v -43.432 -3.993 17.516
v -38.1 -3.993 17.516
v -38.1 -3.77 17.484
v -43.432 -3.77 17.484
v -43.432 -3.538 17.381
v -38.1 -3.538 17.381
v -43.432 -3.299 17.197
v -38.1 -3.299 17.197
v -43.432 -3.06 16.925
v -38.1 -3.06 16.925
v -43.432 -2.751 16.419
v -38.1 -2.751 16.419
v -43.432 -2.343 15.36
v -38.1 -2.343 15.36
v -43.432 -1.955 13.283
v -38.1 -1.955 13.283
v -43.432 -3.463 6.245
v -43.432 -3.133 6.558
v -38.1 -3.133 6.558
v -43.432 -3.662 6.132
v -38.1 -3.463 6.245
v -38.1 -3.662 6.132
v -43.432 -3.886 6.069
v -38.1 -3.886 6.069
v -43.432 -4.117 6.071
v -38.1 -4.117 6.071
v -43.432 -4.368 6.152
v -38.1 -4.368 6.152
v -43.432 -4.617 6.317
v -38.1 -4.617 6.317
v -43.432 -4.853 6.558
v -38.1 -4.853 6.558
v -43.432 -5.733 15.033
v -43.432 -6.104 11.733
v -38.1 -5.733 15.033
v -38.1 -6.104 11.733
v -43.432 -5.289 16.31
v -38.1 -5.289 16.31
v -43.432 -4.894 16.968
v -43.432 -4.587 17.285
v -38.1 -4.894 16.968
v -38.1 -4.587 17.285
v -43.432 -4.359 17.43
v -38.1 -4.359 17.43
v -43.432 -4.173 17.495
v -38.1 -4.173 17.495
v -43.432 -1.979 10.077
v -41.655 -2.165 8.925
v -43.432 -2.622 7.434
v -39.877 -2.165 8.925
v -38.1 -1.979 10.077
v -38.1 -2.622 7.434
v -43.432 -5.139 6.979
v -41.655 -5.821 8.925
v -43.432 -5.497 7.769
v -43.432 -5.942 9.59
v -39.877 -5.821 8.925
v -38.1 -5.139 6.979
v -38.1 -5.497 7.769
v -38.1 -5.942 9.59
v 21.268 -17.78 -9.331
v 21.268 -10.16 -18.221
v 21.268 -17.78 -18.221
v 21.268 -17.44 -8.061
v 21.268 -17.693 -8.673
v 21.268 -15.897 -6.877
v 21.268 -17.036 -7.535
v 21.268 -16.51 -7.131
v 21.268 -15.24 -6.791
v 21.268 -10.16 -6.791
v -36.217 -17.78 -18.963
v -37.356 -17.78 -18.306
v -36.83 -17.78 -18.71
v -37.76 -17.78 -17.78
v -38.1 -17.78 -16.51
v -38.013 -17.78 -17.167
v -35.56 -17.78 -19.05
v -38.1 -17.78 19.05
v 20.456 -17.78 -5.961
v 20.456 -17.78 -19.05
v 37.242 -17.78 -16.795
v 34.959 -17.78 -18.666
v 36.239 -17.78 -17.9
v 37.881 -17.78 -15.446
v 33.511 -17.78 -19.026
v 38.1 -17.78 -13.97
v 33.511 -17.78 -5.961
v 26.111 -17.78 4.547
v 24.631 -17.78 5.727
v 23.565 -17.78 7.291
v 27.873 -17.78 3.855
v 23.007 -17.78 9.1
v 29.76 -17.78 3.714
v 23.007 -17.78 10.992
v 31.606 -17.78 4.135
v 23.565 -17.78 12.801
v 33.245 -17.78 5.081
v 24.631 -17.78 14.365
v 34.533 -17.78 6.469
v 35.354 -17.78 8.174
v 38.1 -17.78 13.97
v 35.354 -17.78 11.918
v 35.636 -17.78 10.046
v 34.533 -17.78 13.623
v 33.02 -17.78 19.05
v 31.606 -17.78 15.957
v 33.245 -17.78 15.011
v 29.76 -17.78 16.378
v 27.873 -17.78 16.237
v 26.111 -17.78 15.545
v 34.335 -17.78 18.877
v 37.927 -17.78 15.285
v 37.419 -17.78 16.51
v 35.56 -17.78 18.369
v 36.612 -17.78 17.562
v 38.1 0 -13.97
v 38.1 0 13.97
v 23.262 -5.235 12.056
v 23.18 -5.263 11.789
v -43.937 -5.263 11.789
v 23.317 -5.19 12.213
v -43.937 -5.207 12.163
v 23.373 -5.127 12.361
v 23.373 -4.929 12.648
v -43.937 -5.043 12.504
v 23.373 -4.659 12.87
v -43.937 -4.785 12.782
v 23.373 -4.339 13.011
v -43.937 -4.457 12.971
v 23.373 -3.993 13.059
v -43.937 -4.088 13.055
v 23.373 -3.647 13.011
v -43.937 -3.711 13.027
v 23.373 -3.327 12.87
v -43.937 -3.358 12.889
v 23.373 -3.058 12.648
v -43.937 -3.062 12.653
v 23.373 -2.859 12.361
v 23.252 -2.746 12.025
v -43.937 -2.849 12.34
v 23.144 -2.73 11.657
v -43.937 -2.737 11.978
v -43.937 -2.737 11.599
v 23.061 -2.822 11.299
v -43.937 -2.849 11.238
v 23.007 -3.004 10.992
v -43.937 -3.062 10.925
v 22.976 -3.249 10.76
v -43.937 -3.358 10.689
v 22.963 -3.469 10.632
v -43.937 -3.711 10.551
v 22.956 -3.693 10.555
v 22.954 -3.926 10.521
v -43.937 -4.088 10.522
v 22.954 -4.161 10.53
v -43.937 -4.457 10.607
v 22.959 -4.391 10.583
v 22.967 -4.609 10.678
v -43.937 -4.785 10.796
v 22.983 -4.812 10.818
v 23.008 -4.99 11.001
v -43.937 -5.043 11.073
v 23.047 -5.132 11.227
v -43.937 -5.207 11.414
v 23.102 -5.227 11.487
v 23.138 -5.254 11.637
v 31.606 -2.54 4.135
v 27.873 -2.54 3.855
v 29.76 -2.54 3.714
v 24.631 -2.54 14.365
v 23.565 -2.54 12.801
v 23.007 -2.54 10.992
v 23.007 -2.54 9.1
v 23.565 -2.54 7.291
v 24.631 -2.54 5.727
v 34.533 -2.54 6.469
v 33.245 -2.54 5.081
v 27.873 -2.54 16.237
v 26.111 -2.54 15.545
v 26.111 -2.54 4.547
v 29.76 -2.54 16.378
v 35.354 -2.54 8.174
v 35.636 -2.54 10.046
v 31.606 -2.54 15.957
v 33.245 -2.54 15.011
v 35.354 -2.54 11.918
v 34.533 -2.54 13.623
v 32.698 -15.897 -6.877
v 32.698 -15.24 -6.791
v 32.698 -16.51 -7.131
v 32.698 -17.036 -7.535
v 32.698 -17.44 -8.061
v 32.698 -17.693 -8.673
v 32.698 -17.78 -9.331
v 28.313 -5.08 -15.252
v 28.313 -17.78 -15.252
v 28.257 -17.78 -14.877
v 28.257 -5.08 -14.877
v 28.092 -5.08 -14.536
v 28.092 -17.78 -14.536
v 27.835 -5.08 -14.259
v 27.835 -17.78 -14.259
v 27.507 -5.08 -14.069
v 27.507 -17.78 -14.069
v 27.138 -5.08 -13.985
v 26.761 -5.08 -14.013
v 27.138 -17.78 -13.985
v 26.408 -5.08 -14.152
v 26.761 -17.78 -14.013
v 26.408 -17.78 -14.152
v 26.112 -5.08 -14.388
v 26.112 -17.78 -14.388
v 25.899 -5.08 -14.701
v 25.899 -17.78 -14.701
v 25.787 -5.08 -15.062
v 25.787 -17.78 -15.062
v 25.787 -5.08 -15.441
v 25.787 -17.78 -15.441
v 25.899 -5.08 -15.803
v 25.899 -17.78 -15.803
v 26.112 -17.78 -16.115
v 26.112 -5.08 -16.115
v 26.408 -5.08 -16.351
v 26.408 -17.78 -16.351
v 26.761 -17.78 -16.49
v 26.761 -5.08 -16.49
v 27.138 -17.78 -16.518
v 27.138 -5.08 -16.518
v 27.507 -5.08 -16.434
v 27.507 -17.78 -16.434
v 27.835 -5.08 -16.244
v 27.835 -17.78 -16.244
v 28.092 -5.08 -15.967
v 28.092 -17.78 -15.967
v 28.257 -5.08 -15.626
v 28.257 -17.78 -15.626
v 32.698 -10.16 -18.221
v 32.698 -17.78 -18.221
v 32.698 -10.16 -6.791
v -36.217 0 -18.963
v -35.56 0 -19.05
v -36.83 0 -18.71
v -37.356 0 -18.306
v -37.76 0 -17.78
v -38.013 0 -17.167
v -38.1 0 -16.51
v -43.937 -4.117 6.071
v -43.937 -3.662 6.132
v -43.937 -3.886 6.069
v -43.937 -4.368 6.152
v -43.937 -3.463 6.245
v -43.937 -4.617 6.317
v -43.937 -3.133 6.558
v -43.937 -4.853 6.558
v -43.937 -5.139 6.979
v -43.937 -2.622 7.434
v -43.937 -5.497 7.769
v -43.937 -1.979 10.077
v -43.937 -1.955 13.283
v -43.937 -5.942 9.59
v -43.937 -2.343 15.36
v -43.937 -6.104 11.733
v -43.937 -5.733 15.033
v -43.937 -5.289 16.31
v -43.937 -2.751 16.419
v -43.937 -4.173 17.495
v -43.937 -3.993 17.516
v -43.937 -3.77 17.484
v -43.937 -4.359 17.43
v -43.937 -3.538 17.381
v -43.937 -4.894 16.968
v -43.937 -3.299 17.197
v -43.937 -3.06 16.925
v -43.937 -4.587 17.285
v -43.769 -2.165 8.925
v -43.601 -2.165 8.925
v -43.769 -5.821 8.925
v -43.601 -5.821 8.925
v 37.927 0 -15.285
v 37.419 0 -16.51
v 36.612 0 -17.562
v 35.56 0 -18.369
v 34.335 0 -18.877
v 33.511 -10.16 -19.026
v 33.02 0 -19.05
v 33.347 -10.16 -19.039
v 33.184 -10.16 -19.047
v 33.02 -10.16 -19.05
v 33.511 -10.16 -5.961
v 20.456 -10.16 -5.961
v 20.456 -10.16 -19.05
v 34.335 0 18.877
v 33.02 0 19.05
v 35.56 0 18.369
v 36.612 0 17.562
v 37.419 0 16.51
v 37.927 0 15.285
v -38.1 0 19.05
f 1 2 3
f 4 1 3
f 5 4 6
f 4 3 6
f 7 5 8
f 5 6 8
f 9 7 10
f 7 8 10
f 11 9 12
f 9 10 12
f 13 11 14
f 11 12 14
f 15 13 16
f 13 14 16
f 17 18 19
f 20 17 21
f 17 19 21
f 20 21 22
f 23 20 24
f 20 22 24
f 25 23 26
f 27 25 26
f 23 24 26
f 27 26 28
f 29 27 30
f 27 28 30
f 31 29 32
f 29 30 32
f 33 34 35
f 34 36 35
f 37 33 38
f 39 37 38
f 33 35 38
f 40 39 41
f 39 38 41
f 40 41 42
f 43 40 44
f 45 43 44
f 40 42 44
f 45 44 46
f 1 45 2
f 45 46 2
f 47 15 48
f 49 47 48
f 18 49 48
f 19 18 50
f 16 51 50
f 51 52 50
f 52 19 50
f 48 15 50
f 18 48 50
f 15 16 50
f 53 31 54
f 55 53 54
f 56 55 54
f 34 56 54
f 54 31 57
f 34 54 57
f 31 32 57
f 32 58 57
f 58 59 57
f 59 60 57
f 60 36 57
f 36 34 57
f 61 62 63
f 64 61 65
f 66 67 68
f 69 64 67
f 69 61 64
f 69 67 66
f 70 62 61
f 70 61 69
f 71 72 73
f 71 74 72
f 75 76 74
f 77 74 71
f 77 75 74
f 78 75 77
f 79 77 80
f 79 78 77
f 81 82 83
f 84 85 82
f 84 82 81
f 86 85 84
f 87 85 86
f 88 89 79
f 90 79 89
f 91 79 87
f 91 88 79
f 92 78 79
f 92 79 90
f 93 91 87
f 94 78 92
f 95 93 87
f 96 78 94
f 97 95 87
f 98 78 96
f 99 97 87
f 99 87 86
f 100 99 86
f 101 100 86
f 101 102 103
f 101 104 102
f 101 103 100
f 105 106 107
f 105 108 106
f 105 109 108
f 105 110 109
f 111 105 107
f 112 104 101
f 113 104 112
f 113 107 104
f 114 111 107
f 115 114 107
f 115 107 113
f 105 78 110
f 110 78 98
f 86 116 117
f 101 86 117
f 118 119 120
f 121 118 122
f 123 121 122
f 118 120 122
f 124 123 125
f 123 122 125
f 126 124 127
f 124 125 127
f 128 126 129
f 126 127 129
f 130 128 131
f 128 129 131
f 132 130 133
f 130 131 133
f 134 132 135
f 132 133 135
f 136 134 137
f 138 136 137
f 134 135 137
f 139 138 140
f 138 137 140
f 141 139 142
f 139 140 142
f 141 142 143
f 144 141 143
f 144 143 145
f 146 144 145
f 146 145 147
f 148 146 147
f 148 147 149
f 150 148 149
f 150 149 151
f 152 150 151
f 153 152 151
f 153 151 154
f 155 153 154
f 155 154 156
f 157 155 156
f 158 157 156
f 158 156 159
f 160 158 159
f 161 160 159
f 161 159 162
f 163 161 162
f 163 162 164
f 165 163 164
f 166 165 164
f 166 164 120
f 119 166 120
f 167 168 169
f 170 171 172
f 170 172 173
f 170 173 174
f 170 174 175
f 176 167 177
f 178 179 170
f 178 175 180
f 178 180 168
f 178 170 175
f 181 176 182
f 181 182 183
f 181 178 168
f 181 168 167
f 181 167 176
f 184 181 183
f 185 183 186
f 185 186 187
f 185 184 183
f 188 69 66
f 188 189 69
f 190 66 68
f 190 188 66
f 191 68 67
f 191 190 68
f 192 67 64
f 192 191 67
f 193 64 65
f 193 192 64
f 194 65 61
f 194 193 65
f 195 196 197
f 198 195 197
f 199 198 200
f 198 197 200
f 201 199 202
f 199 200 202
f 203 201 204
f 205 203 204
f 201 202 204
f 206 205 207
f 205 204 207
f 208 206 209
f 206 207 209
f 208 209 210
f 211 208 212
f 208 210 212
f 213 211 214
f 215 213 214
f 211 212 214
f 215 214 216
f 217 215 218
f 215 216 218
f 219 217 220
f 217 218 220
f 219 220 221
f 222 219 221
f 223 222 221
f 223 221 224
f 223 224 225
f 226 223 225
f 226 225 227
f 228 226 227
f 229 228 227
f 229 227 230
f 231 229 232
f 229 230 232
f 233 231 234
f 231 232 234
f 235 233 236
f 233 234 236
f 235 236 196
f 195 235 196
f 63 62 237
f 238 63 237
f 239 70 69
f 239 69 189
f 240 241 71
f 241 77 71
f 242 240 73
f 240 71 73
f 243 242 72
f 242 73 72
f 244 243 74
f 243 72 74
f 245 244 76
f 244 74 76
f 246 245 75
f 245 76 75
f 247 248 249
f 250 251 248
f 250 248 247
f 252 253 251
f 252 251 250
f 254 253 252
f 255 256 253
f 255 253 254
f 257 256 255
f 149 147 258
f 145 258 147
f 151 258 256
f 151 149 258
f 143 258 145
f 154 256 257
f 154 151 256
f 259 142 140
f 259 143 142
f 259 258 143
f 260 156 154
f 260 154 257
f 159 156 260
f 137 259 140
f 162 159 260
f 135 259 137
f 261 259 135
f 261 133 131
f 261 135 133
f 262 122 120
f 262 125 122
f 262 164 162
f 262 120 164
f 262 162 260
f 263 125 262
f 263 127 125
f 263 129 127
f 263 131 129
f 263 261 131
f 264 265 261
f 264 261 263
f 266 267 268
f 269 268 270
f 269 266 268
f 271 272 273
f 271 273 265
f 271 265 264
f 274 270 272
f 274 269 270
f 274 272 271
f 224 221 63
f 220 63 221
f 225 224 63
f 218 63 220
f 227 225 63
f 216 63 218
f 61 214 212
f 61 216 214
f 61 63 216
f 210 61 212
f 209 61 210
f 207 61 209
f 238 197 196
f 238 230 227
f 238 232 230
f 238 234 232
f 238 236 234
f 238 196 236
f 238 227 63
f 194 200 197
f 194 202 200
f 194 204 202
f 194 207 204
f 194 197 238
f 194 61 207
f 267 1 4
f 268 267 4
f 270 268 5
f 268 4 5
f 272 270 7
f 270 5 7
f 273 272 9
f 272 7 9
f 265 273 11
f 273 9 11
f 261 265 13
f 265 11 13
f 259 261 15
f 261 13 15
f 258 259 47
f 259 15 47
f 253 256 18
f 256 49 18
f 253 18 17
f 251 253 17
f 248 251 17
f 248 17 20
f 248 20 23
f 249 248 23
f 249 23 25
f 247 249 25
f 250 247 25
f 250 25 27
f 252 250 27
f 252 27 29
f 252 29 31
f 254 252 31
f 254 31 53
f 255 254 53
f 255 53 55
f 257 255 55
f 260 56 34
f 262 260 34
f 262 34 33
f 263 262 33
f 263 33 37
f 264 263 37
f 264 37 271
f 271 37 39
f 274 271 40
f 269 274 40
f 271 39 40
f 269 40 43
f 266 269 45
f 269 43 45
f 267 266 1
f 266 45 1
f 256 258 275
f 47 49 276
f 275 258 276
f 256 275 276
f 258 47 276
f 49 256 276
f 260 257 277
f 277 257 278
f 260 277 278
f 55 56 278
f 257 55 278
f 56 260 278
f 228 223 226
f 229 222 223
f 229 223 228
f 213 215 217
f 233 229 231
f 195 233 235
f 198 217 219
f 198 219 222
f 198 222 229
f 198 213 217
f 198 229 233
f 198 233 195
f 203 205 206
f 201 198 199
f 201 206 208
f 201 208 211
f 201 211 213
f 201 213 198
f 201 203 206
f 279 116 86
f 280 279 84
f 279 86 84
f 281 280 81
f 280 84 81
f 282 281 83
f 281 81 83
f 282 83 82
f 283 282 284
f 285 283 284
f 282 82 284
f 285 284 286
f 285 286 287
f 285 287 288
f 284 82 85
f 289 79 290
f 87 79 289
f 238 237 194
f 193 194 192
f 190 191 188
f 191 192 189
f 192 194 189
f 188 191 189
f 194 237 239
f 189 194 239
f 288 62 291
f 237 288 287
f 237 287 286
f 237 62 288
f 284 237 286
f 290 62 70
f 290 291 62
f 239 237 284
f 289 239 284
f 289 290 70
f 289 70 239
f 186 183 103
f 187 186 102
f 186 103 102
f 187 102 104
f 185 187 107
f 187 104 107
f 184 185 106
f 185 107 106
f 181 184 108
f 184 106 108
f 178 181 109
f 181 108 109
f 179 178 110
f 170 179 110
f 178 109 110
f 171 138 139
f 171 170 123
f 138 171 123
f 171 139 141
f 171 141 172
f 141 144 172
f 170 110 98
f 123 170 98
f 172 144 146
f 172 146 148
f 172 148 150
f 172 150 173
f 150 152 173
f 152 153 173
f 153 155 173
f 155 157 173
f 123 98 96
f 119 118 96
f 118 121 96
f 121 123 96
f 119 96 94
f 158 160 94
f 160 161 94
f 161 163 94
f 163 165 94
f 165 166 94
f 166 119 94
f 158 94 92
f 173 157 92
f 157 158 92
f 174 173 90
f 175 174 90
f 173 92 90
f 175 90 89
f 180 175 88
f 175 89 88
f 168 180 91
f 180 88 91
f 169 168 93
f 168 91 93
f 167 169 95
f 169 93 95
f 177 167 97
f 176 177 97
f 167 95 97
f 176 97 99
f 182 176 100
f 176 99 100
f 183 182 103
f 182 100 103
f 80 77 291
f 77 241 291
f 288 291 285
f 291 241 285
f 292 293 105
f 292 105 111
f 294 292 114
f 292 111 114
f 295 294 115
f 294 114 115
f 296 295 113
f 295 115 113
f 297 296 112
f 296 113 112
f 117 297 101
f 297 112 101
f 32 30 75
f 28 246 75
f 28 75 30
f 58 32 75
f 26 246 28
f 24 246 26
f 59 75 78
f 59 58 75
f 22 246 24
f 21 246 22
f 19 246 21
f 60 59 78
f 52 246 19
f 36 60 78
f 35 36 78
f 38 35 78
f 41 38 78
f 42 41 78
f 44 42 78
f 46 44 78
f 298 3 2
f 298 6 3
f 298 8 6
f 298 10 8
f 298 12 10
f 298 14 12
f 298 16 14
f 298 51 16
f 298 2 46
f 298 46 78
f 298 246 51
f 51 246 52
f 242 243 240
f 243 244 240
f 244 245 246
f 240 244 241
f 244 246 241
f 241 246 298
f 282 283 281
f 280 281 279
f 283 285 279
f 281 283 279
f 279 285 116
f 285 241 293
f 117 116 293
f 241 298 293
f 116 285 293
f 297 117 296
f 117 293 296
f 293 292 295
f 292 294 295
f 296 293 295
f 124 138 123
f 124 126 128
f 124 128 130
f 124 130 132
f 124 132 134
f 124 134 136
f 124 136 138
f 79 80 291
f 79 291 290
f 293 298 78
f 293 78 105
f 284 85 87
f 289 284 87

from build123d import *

# Parameters (mm, degrees)
F0_W      = 76.2
F0_H      = 38.1
F1_DEPTH  = 17.78
F2_R      = 6.35
F3_DEPTH  = 15.24
F5_DEPTH  = 5.332479
F6_DEPTH  = 5.837152
F7_R      = 1.27
F8_DEPTH  = 67.31
F9_R      = 5.08
F10_R     = 5.08
F11_W     = 13.054326
F11_H     = 13.088878
F12_DEPTH = 7.62
F13_W     = 11.43
F13_H     = 11.43
F14_DEPTH = 7.62
F15_R     = 2.54
F16_R     = 1.27
F17_DEPTH = 12.7
F18_R     = 2.54


with BuildPart() as f1:
    # F0 (on Front) → F1 (new body)
    with BuildSketch(Plane.XZ):
        Rectangle(F0_W, F0_H)
    extrude(amount=F1_DEPTH)

    # F2 (on face) → F3 (cut)
    with BuildSketch(Plane.XZ.offset(17.78)):
        with Locations((29.285945, 10.045934)):
            Circle(F2_R)
    extrude(amount=-F3_DEPTH, mode=Mode.SUBTRACT)

    # F4 (on face) → F5 (join)
    with BuildSketch(Plane(origin=(-38.1, 0, 0), x_dir=(0, -1, 0), z_dir=(-1, 0, 0))):
        with BuildLine():
            add(Edge.make_bspline(
                [(3.993284, 17.51616), (0.337111, 17.51616), (2.165198, 8.925081), (3.993284, 0.334002), (5.82137, 8.925081), (7.649457, 17.51616), (3.993284, 17.51616)],
                knots=[0, 0, 0, 2.094395, 2.094395, 4.18879, 4.18879, 6.283185, 6.283185, 6.283185], degree=2, weights=[1, 0.5, 1, 0.5, 1, 0.5, 1]))
        make_face()
    extrude(amount=F5_DEPTH)

    # F4 (on face) → F6 (join)
    with BuildSketch(Plane(origin=(-38.1, 0, 0), x_dir=(0, -1, 0), z_dir=(-1, 0, 0))):
        with BuildLine():
            add(Edge.make_bspline(
                [(3.993284, 17.51616), (0.337111, 17.51616), (2.165198, 8.925081), (3.993284, 0.334002), (5.82137, 8.925081), (7.649457, 17.51616), (3.993284, 17.51616)],
                knots=[0, 0, 0, 2.094395, 2.094395, 4.18879, 4.18879, 6.283185, 6.283185, 6.283185], degree=2, weights=[1, 0.5, 1, 0.5, 1, 0.5, 1]))
        make_face()
    extrude(amount=F6_DEPTH)

    # F7 (on face) → F8 (cut)
    with BuildSketch(Plane(origin=(-43.937152, 0, 0), x_dir=(0, -1, 0), z_dir=(-1, 0, 0))):
        with Locations((3.993284, 11.788774)):
            Circle(F7_R)
    extrude(amount=-F8_DEPTH, mode=Mode.SUBTRACT)

    # F9
    f9_edges = [f1.edges().sort_by_distance(p)[0] for p in [
        (38.1, -8.89, 19.05),
    ]]
    fillet(f9_edges, radius=F9_R)

    # F10
    f10_edges = [f1.edges().sort_by_distance(p)[0] for p in [
        (38.1, -8.89, -19.05),
    ]]
    fillet(f10_edges, radius=F10_R)

    # F11 (on face) → F12 (cut)
    with BuildSketch(Plane.XZ.offset(17.78)):
        with Locations((26.983425, -12.505561)):
            Rectangle(F11_W, F11_H)
    extrude(amount=-F12_DEPTH, mode=Mode.SUBTRACT)

    # F13 (on face) → F14 (join)
    with BuildSketch(Plane.XZ.offset(10.16)):
        with Locations((26.983425, -12.505561)):
            Rectangle(F13_W, F13_H)
    extrude(amount=F14_DEPTH)

    # F15
    f15_edges = [f1.edges().sort_by_distance(p)[0] for p in [
        (26.983425, -17.78, -6.790561),
    ]]
    fillet(f15_edges, radius=F15_R)

    # F16 (on face) → F17 (cut)
    with BuildSketch(Plane.XZ.offset(17.78)):
        with Locations((27.043138, -15.251571)):
            Circle(F16_R)
    extrude(amount=-F17_DEPTH, mode=Mode.SUBTRACT)

    # F18
    f18_edges = [f1.edges().sort_by_distance(p)[0] for p in [
        (-38.1, -8.89, -19.05),
    ]]
    fillet(f18_edges, radius=F18_R)


solid = f1.part
